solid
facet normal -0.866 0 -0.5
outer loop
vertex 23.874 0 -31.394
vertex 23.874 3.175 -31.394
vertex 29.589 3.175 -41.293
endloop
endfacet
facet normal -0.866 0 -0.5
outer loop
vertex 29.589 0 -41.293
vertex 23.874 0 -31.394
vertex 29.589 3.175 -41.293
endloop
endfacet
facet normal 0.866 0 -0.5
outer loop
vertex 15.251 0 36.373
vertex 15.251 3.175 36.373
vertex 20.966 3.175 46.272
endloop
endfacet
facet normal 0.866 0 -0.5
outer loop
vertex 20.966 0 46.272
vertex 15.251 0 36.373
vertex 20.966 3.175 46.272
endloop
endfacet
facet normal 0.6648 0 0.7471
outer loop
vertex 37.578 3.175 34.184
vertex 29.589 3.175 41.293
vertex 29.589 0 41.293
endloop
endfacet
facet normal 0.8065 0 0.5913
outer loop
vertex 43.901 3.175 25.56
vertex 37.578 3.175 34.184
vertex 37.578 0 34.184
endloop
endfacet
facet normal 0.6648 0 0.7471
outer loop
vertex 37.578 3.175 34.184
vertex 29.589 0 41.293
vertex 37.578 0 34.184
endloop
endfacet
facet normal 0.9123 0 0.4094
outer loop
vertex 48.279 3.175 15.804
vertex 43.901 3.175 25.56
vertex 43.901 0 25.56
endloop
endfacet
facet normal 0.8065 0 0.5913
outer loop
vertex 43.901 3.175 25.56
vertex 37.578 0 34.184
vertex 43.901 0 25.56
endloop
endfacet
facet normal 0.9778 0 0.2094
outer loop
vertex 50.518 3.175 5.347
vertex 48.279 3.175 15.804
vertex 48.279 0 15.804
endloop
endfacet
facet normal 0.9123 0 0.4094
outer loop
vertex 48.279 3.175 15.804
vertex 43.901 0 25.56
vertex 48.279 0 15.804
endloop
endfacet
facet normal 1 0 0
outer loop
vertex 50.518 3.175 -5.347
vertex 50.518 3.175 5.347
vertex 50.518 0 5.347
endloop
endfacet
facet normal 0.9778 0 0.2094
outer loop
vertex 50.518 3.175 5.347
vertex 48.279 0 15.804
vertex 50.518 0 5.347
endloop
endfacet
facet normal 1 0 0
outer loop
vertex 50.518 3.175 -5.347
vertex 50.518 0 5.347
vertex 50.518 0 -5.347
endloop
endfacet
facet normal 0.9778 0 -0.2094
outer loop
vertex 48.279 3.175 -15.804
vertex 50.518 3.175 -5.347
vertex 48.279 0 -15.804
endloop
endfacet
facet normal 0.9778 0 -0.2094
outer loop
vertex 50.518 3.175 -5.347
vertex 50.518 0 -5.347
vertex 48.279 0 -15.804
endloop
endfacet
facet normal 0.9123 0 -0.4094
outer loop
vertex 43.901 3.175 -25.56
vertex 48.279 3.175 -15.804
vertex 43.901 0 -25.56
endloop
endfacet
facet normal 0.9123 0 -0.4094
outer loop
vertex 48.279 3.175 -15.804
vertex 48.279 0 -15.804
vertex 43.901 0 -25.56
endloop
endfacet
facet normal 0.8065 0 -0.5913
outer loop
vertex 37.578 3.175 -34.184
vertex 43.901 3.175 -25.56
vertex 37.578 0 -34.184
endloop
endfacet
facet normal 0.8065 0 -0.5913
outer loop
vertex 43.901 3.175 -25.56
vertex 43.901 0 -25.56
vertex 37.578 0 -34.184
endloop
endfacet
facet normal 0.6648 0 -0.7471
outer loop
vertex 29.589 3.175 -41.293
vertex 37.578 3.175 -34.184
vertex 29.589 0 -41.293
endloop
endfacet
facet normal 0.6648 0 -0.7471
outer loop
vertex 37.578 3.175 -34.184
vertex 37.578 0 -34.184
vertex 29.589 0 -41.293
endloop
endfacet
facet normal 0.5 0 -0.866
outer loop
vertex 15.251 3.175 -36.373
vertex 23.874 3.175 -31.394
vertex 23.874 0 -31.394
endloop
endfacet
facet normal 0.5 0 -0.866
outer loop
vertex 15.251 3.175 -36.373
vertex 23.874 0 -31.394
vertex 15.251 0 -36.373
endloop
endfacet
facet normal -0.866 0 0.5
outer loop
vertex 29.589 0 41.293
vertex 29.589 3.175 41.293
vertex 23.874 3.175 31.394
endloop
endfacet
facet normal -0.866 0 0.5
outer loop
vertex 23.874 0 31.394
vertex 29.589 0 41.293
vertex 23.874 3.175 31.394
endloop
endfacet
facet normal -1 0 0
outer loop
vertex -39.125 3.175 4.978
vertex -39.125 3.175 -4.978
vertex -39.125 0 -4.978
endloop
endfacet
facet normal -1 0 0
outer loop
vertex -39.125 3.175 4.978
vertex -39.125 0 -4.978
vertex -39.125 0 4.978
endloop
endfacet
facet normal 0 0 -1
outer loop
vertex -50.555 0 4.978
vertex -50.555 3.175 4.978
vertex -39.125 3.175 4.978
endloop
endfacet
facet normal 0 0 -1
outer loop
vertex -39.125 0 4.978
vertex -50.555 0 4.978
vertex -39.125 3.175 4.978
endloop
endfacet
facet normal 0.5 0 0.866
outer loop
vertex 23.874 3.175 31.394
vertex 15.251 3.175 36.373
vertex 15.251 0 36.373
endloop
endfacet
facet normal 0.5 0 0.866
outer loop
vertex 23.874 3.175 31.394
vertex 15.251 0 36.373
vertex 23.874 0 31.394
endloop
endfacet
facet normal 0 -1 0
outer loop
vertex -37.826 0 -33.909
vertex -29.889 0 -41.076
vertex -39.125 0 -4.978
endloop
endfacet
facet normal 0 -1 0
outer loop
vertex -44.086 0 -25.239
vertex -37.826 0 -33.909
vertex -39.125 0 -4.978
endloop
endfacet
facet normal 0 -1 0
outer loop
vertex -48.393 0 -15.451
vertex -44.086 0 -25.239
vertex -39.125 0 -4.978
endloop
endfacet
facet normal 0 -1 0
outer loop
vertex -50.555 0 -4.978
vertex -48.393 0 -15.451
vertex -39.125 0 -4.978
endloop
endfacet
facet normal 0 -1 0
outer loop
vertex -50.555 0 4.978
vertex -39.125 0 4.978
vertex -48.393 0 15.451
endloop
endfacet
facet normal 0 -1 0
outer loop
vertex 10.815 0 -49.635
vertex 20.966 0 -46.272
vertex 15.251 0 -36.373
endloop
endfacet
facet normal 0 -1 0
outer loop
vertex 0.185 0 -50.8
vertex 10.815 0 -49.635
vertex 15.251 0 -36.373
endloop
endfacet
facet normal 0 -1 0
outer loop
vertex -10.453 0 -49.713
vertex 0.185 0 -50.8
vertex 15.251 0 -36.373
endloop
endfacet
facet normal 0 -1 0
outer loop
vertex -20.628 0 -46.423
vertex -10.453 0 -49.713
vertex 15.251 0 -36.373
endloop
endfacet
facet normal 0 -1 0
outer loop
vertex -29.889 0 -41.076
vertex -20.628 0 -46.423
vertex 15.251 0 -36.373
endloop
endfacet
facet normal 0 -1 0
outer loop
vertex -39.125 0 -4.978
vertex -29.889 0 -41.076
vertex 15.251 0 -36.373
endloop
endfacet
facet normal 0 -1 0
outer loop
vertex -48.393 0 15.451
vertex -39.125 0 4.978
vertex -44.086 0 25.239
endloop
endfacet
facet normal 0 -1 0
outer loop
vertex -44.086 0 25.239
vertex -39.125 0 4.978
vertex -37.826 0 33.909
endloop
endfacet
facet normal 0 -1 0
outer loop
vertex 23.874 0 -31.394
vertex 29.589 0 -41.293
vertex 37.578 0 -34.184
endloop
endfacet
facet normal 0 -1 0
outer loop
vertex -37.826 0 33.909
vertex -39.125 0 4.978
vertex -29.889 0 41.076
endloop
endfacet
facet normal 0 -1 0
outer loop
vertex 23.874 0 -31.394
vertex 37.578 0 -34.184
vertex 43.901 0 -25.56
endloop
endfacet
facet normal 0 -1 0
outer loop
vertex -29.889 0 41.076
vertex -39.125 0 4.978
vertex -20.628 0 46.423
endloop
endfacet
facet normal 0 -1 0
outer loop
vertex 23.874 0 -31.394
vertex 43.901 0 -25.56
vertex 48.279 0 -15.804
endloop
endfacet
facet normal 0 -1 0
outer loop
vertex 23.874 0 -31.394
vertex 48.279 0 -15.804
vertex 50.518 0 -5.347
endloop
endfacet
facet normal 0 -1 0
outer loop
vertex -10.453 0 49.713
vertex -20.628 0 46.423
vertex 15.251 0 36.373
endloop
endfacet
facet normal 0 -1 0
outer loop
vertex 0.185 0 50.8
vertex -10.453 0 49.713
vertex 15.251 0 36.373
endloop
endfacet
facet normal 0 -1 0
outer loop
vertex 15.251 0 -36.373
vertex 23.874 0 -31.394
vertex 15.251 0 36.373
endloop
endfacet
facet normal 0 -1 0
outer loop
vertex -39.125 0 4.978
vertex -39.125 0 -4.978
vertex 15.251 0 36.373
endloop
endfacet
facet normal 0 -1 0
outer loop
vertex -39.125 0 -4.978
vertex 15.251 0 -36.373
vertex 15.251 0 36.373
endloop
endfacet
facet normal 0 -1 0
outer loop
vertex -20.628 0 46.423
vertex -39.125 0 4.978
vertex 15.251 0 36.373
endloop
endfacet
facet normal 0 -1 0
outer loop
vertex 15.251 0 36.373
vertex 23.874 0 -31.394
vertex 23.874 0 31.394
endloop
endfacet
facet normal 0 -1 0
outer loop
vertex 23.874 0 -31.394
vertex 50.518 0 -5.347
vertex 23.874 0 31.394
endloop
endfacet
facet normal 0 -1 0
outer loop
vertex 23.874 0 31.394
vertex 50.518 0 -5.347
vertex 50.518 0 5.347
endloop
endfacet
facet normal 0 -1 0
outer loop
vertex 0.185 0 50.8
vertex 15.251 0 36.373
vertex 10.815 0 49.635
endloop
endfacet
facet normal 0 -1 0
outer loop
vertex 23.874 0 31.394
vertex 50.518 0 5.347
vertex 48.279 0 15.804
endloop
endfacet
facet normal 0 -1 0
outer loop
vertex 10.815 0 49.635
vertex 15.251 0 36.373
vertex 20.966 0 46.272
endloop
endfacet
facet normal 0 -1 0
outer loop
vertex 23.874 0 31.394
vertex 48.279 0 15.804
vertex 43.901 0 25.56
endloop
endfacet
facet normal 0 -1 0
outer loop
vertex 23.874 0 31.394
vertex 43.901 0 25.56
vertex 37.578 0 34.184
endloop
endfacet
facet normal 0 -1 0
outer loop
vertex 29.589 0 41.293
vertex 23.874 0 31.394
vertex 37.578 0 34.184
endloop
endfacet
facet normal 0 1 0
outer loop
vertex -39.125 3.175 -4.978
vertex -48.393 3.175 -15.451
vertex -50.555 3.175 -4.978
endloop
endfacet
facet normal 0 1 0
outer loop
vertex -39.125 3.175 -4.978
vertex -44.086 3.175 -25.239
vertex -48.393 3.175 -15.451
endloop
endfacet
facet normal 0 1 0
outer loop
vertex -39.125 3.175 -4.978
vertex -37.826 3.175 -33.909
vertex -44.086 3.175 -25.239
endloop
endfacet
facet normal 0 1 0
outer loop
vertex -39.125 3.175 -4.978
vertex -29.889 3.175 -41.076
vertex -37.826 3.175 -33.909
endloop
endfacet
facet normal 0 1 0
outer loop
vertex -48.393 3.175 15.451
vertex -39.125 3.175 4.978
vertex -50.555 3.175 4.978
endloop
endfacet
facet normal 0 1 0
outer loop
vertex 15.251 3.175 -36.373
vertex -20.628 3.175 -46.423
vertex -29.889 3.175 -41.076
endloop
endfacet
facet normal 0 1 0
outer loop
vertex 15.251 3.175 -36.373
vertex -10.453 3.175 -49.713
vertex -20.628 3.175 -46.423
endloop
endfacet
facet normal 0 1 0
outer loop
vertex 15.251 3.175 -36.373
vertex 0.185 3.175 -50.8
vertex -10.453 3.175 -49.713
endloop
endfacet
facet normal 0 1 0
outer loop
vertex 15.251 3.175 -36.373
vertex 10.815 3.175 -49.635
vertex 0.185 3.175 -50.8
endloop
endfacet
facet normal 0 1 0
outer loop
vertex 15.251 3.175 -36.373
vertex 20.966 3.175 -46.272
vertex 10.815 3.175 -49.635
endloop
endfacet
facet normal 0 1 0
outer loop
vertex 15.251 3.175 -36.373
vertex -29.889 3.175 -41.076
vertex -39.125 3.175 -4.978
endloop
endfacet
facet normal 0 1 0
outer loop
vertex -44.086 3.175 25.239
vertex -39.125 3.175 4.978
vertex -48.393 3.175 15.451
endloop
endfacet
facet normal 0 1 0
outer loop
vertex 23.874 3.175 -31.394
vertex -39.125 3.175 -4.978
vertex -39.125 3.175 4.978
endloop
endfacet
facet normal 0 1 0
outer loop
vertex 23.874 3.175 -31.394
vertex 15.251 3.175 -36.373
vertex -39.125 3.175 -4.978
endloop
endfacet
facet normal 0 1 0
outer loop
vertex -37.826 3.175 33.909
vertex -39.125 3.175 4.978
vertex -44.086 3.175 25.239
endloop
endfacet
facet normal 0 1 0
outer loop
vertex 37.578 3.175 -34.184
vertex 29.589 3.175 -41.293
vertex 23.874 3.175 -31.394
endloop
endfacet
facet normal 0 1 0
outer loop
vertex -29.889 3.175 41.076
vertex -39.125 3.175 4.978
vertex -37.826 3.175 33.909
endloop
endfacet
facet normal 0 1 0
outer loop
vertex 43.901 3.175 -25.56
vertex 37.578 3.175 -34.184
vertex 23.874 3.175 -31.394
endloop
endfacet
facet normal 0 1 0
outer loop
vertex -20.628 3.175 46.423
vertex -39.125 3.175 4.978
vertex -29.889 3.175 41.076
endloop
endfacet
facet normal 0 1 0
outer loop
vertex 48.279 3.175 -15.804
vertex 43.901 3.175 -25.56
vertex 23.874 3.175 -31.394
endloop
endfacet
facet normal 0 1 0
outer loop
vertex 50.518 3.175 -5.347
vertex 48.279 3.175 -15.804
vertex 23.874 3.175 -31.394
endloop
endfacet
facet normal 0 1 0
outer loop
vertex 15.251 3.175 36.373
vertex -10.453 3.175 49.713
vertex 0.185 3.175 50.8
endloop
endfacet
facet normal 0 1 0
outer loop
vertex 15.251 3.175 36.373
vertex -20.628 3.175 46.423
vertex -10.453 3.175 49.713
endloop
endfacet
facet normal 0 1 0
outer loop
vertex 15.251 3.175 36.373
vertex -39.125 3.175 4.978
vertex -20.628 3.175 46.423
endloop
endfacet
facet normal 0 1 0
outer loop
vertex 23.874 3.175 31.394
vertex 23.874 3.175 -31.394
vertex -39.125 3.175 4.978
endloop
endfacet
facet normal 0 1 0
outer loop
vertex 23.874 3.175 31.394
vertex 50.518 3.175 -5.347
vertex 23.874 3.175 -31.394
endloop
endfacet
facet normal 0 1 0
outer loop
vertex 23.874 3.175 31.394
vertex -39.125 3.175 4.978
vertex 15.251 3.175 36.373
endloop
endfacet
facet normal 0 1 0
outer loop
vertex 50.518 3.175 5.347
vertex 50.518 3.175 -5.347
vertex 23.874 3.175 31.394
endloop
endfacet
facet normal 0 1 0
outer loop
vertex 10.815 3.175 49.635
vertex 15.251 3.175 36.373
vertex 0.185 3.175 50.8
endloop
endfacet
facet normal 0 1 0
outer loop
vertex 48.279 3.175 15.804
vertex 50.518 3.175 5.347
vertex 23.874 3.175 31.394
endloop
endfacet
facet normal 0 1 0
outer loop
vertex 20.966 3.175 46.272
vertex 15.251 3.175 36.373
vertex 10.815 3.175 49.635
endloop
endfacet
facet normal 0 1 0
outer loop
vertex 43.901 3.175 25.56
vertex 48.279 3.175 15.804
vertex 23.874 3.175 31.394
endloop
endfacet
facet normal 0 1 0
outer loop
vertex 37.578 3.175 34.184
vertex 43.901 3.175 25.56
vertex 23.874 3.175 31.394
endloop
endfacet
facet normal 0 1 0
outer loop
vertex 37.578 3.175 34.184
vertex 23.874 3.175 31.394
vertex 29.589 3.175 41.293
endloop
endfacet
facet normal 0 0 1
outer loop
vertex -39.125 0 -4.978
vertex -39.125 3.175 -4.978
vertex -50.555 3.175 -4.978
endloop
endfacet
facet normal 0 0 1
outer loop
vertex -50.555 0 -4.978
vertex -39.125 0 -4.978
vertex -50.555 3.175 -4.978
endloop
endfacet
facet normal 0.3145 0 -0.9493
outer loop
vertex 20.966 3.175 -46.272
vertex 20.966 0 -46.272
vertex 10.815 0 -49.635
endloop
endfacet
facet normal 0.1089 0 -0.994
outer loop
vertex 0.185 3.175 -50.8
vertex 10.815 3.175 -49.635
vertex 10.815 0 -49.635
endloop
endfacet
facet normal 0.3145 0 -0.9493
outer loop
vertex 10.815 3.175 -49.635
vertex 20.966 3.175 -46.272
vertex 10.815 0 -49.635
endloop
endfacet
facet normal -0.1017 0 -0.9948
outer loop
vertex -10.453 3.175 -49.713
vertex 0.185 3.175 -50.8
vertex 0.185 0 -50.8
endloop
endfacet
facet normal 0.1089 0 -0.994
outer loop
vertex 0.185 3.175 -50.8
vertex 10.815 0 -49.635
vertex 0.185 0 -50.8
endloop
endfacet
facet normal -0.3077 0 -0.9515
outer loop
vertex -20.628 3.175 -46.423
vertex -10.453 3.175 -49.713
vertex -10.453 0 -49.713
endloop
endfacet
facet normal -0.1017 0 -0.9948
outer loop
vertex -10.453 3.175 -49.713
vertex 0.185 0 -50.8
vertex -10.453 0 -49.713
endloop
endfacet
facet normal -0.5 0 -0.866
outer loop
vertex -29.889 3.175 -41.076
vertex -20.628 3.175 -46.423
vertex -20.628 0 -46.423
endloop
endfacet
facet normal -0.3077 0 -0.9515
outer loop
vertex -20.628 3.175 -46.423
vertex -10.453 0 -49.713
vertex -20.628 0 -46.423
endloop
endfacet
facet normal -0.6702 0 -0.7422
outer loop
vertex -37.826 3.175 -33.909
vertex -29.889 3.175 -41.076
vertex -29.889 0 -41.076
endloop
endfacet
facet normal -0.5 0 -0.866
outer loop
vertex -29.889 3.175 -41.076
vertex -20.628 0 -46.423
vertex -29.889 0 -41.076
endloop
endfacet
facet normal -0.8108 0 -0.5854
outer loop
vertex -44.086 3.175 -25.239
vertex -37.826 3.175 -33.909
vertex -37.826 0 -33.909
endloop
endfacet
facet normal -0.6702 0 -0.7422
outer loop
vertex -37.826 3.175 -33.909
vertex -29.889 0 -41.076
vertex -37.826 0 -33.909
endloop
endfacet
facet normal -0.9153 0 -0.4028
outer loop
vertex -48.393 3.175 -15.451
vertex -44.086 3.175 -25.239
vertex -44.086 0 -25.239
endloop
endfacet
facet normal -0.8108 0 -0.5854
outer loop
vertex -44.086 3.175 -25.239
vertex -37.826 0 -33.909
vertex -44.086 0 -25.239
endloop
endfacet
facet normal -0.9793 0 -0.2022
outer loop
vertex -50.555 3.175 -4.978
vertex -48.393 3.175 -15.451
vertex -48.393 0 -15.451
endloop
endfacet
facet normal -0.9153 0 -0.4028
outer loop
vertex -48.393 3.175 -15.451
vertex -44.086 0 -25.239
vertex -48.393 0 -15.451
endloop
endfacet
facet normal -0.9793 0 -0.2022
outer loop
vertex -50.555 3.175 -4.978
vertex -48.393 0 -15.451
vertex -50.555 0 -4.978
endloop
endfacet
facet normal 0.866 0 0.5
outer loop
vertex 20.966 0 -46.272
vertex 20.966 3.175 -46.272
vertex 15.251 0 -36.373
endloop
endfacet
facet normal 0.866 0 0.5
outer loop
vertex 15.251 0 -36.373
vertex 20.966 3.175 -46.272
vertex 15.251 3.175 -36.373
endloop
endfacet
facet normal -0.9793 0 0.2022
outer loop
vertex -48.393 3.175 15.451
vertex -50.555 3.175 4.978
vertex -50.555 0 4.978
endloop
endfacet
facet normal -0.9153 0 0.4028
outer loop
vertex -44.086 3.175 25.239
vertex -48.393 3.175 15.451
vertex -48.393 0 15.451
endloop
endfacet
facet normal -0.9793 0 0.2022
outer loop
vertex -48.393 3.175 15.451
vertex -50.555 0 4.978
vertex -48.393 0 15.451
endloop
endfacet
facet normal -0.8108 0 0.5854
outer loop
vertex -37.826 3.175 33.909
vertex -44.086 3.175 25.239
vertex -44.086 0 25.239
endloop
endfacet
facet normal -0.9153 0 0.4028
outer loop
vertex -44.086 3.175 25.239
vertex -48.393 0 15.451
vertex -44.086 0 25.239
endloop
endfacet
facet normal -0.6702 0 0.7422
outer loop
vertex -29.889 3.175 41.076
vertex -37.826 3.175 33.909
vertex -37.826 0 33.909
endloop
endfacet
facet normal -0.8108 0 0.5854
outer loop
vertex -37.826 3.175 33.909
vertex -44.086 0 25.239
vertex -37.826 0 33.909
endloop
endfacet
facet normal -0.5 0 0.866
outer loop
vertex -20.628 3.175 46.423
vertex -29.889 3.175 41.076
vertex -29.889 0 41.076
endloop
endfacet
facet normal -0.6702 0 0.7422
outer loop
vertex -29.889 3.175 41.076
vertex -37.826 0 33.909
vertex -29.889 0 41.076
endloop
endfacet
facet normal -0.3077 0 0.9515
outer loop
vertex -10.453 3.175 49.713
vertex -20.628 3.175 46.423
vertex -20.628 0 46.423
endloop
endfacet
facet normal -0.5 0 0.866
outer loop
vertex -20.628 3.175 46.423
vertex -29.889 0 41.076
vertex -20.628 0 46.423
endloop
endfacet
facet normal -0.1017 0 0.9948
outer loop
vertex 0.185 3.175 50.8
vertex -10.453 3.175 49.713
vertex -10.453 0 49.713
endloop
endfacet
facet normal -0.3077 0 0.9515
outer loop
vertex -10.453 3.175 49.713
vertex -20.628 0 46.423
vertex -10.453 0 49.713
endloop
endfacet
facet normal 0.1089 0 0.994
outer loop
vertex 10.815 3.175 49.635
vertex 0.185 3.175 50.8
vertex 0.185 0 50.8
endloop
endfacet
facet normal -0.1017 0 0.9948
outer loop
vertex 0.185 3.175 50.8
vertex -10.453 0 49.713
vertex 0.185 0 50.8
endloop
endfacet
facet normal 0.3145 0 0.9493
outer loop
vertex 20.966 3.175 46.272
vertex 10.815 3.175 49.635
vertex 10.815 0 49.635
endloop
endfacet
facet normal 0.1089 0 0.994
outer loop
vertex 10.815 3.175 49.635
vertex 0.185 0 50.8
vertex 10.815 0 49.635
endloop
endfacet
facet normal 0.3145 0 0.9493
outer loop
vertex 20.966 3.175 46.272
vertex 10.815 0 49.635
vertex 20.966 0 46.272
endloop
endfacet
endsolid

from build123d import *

# Parameters (mm, degrees)
SKETCH1_R         = 50.8
EXTRUDE1_DEPTH    = 3.175
EXTRUDE2_DEPTH    = 72.912172996
CIRPATTERN1_COUNT = 2
CIRPATTERN1_ANGLE = 120
CIRPATTERN2_COUNT = 2
CIRPATTERN2_ANGLE = 120


with BuildPart() as part:
    # Sketch1 → Extrude1 (new body)
    with BuildSketch(Plane(origin=(0, 0, 0), x_dir=(1, 0, 0), z_dir=(0, 1, 0))):
        with Locations(Location((0, 0, 0), (0, 0, 270))):
            Circle(SKETCH1_R)
    extrude(amount=EXTRUDE1_DEPTH)

    # Sketch3 → Extrude2 (cut, through all)
    with BuildSketch(Plane(origin=(0, 3.175, 0), x_dir=(-1, 0, 0), z_dir=(0, 1, 0))):
        Polygon((42.177913697, -4.9784), (39.125469867, -4.9784), (39.125469867, 4.9784), (42.300469867, 4.9784), (50.555469867, 4.9784), (52.750339101, 4.9784), (52.750339101, -4.9784), (50.555469867, -4.9784), align=None)
    extrude2 = extrude(amount=-EXTRUDE2_DEPTH, mode=Mode.SUBTRACT)

    # CirPattern1: Extrude2 ×2 about axis
    cirpattern1_axis = Axis((0, 38.178274824, 0), (0, -1, 0))
    for i in range(1, CIRPATTERN1_COUNT):
        add(extrude2.rotate(cirpattern1_axis, i * CIRPATTERN1_ANGLE / (CIRPATTERN1_COUNT - 1)), mode=Mode.SUBTRACT)

    # CirPattern2: Extrude2 ×2 about axis
    cirpattern2_axis = Axis((0, 0, 0), (0, 1, 0))
    for i in range(1, CIRPATTERN2_COUNT):
        add(extrude2.rotate(cirpattern2_axis, i * CIRPATTERN2_ANGLE / (CIRPATTERN2_COUNT - 1)), mode=Mode.SUBTRACT)


solid = part.part
